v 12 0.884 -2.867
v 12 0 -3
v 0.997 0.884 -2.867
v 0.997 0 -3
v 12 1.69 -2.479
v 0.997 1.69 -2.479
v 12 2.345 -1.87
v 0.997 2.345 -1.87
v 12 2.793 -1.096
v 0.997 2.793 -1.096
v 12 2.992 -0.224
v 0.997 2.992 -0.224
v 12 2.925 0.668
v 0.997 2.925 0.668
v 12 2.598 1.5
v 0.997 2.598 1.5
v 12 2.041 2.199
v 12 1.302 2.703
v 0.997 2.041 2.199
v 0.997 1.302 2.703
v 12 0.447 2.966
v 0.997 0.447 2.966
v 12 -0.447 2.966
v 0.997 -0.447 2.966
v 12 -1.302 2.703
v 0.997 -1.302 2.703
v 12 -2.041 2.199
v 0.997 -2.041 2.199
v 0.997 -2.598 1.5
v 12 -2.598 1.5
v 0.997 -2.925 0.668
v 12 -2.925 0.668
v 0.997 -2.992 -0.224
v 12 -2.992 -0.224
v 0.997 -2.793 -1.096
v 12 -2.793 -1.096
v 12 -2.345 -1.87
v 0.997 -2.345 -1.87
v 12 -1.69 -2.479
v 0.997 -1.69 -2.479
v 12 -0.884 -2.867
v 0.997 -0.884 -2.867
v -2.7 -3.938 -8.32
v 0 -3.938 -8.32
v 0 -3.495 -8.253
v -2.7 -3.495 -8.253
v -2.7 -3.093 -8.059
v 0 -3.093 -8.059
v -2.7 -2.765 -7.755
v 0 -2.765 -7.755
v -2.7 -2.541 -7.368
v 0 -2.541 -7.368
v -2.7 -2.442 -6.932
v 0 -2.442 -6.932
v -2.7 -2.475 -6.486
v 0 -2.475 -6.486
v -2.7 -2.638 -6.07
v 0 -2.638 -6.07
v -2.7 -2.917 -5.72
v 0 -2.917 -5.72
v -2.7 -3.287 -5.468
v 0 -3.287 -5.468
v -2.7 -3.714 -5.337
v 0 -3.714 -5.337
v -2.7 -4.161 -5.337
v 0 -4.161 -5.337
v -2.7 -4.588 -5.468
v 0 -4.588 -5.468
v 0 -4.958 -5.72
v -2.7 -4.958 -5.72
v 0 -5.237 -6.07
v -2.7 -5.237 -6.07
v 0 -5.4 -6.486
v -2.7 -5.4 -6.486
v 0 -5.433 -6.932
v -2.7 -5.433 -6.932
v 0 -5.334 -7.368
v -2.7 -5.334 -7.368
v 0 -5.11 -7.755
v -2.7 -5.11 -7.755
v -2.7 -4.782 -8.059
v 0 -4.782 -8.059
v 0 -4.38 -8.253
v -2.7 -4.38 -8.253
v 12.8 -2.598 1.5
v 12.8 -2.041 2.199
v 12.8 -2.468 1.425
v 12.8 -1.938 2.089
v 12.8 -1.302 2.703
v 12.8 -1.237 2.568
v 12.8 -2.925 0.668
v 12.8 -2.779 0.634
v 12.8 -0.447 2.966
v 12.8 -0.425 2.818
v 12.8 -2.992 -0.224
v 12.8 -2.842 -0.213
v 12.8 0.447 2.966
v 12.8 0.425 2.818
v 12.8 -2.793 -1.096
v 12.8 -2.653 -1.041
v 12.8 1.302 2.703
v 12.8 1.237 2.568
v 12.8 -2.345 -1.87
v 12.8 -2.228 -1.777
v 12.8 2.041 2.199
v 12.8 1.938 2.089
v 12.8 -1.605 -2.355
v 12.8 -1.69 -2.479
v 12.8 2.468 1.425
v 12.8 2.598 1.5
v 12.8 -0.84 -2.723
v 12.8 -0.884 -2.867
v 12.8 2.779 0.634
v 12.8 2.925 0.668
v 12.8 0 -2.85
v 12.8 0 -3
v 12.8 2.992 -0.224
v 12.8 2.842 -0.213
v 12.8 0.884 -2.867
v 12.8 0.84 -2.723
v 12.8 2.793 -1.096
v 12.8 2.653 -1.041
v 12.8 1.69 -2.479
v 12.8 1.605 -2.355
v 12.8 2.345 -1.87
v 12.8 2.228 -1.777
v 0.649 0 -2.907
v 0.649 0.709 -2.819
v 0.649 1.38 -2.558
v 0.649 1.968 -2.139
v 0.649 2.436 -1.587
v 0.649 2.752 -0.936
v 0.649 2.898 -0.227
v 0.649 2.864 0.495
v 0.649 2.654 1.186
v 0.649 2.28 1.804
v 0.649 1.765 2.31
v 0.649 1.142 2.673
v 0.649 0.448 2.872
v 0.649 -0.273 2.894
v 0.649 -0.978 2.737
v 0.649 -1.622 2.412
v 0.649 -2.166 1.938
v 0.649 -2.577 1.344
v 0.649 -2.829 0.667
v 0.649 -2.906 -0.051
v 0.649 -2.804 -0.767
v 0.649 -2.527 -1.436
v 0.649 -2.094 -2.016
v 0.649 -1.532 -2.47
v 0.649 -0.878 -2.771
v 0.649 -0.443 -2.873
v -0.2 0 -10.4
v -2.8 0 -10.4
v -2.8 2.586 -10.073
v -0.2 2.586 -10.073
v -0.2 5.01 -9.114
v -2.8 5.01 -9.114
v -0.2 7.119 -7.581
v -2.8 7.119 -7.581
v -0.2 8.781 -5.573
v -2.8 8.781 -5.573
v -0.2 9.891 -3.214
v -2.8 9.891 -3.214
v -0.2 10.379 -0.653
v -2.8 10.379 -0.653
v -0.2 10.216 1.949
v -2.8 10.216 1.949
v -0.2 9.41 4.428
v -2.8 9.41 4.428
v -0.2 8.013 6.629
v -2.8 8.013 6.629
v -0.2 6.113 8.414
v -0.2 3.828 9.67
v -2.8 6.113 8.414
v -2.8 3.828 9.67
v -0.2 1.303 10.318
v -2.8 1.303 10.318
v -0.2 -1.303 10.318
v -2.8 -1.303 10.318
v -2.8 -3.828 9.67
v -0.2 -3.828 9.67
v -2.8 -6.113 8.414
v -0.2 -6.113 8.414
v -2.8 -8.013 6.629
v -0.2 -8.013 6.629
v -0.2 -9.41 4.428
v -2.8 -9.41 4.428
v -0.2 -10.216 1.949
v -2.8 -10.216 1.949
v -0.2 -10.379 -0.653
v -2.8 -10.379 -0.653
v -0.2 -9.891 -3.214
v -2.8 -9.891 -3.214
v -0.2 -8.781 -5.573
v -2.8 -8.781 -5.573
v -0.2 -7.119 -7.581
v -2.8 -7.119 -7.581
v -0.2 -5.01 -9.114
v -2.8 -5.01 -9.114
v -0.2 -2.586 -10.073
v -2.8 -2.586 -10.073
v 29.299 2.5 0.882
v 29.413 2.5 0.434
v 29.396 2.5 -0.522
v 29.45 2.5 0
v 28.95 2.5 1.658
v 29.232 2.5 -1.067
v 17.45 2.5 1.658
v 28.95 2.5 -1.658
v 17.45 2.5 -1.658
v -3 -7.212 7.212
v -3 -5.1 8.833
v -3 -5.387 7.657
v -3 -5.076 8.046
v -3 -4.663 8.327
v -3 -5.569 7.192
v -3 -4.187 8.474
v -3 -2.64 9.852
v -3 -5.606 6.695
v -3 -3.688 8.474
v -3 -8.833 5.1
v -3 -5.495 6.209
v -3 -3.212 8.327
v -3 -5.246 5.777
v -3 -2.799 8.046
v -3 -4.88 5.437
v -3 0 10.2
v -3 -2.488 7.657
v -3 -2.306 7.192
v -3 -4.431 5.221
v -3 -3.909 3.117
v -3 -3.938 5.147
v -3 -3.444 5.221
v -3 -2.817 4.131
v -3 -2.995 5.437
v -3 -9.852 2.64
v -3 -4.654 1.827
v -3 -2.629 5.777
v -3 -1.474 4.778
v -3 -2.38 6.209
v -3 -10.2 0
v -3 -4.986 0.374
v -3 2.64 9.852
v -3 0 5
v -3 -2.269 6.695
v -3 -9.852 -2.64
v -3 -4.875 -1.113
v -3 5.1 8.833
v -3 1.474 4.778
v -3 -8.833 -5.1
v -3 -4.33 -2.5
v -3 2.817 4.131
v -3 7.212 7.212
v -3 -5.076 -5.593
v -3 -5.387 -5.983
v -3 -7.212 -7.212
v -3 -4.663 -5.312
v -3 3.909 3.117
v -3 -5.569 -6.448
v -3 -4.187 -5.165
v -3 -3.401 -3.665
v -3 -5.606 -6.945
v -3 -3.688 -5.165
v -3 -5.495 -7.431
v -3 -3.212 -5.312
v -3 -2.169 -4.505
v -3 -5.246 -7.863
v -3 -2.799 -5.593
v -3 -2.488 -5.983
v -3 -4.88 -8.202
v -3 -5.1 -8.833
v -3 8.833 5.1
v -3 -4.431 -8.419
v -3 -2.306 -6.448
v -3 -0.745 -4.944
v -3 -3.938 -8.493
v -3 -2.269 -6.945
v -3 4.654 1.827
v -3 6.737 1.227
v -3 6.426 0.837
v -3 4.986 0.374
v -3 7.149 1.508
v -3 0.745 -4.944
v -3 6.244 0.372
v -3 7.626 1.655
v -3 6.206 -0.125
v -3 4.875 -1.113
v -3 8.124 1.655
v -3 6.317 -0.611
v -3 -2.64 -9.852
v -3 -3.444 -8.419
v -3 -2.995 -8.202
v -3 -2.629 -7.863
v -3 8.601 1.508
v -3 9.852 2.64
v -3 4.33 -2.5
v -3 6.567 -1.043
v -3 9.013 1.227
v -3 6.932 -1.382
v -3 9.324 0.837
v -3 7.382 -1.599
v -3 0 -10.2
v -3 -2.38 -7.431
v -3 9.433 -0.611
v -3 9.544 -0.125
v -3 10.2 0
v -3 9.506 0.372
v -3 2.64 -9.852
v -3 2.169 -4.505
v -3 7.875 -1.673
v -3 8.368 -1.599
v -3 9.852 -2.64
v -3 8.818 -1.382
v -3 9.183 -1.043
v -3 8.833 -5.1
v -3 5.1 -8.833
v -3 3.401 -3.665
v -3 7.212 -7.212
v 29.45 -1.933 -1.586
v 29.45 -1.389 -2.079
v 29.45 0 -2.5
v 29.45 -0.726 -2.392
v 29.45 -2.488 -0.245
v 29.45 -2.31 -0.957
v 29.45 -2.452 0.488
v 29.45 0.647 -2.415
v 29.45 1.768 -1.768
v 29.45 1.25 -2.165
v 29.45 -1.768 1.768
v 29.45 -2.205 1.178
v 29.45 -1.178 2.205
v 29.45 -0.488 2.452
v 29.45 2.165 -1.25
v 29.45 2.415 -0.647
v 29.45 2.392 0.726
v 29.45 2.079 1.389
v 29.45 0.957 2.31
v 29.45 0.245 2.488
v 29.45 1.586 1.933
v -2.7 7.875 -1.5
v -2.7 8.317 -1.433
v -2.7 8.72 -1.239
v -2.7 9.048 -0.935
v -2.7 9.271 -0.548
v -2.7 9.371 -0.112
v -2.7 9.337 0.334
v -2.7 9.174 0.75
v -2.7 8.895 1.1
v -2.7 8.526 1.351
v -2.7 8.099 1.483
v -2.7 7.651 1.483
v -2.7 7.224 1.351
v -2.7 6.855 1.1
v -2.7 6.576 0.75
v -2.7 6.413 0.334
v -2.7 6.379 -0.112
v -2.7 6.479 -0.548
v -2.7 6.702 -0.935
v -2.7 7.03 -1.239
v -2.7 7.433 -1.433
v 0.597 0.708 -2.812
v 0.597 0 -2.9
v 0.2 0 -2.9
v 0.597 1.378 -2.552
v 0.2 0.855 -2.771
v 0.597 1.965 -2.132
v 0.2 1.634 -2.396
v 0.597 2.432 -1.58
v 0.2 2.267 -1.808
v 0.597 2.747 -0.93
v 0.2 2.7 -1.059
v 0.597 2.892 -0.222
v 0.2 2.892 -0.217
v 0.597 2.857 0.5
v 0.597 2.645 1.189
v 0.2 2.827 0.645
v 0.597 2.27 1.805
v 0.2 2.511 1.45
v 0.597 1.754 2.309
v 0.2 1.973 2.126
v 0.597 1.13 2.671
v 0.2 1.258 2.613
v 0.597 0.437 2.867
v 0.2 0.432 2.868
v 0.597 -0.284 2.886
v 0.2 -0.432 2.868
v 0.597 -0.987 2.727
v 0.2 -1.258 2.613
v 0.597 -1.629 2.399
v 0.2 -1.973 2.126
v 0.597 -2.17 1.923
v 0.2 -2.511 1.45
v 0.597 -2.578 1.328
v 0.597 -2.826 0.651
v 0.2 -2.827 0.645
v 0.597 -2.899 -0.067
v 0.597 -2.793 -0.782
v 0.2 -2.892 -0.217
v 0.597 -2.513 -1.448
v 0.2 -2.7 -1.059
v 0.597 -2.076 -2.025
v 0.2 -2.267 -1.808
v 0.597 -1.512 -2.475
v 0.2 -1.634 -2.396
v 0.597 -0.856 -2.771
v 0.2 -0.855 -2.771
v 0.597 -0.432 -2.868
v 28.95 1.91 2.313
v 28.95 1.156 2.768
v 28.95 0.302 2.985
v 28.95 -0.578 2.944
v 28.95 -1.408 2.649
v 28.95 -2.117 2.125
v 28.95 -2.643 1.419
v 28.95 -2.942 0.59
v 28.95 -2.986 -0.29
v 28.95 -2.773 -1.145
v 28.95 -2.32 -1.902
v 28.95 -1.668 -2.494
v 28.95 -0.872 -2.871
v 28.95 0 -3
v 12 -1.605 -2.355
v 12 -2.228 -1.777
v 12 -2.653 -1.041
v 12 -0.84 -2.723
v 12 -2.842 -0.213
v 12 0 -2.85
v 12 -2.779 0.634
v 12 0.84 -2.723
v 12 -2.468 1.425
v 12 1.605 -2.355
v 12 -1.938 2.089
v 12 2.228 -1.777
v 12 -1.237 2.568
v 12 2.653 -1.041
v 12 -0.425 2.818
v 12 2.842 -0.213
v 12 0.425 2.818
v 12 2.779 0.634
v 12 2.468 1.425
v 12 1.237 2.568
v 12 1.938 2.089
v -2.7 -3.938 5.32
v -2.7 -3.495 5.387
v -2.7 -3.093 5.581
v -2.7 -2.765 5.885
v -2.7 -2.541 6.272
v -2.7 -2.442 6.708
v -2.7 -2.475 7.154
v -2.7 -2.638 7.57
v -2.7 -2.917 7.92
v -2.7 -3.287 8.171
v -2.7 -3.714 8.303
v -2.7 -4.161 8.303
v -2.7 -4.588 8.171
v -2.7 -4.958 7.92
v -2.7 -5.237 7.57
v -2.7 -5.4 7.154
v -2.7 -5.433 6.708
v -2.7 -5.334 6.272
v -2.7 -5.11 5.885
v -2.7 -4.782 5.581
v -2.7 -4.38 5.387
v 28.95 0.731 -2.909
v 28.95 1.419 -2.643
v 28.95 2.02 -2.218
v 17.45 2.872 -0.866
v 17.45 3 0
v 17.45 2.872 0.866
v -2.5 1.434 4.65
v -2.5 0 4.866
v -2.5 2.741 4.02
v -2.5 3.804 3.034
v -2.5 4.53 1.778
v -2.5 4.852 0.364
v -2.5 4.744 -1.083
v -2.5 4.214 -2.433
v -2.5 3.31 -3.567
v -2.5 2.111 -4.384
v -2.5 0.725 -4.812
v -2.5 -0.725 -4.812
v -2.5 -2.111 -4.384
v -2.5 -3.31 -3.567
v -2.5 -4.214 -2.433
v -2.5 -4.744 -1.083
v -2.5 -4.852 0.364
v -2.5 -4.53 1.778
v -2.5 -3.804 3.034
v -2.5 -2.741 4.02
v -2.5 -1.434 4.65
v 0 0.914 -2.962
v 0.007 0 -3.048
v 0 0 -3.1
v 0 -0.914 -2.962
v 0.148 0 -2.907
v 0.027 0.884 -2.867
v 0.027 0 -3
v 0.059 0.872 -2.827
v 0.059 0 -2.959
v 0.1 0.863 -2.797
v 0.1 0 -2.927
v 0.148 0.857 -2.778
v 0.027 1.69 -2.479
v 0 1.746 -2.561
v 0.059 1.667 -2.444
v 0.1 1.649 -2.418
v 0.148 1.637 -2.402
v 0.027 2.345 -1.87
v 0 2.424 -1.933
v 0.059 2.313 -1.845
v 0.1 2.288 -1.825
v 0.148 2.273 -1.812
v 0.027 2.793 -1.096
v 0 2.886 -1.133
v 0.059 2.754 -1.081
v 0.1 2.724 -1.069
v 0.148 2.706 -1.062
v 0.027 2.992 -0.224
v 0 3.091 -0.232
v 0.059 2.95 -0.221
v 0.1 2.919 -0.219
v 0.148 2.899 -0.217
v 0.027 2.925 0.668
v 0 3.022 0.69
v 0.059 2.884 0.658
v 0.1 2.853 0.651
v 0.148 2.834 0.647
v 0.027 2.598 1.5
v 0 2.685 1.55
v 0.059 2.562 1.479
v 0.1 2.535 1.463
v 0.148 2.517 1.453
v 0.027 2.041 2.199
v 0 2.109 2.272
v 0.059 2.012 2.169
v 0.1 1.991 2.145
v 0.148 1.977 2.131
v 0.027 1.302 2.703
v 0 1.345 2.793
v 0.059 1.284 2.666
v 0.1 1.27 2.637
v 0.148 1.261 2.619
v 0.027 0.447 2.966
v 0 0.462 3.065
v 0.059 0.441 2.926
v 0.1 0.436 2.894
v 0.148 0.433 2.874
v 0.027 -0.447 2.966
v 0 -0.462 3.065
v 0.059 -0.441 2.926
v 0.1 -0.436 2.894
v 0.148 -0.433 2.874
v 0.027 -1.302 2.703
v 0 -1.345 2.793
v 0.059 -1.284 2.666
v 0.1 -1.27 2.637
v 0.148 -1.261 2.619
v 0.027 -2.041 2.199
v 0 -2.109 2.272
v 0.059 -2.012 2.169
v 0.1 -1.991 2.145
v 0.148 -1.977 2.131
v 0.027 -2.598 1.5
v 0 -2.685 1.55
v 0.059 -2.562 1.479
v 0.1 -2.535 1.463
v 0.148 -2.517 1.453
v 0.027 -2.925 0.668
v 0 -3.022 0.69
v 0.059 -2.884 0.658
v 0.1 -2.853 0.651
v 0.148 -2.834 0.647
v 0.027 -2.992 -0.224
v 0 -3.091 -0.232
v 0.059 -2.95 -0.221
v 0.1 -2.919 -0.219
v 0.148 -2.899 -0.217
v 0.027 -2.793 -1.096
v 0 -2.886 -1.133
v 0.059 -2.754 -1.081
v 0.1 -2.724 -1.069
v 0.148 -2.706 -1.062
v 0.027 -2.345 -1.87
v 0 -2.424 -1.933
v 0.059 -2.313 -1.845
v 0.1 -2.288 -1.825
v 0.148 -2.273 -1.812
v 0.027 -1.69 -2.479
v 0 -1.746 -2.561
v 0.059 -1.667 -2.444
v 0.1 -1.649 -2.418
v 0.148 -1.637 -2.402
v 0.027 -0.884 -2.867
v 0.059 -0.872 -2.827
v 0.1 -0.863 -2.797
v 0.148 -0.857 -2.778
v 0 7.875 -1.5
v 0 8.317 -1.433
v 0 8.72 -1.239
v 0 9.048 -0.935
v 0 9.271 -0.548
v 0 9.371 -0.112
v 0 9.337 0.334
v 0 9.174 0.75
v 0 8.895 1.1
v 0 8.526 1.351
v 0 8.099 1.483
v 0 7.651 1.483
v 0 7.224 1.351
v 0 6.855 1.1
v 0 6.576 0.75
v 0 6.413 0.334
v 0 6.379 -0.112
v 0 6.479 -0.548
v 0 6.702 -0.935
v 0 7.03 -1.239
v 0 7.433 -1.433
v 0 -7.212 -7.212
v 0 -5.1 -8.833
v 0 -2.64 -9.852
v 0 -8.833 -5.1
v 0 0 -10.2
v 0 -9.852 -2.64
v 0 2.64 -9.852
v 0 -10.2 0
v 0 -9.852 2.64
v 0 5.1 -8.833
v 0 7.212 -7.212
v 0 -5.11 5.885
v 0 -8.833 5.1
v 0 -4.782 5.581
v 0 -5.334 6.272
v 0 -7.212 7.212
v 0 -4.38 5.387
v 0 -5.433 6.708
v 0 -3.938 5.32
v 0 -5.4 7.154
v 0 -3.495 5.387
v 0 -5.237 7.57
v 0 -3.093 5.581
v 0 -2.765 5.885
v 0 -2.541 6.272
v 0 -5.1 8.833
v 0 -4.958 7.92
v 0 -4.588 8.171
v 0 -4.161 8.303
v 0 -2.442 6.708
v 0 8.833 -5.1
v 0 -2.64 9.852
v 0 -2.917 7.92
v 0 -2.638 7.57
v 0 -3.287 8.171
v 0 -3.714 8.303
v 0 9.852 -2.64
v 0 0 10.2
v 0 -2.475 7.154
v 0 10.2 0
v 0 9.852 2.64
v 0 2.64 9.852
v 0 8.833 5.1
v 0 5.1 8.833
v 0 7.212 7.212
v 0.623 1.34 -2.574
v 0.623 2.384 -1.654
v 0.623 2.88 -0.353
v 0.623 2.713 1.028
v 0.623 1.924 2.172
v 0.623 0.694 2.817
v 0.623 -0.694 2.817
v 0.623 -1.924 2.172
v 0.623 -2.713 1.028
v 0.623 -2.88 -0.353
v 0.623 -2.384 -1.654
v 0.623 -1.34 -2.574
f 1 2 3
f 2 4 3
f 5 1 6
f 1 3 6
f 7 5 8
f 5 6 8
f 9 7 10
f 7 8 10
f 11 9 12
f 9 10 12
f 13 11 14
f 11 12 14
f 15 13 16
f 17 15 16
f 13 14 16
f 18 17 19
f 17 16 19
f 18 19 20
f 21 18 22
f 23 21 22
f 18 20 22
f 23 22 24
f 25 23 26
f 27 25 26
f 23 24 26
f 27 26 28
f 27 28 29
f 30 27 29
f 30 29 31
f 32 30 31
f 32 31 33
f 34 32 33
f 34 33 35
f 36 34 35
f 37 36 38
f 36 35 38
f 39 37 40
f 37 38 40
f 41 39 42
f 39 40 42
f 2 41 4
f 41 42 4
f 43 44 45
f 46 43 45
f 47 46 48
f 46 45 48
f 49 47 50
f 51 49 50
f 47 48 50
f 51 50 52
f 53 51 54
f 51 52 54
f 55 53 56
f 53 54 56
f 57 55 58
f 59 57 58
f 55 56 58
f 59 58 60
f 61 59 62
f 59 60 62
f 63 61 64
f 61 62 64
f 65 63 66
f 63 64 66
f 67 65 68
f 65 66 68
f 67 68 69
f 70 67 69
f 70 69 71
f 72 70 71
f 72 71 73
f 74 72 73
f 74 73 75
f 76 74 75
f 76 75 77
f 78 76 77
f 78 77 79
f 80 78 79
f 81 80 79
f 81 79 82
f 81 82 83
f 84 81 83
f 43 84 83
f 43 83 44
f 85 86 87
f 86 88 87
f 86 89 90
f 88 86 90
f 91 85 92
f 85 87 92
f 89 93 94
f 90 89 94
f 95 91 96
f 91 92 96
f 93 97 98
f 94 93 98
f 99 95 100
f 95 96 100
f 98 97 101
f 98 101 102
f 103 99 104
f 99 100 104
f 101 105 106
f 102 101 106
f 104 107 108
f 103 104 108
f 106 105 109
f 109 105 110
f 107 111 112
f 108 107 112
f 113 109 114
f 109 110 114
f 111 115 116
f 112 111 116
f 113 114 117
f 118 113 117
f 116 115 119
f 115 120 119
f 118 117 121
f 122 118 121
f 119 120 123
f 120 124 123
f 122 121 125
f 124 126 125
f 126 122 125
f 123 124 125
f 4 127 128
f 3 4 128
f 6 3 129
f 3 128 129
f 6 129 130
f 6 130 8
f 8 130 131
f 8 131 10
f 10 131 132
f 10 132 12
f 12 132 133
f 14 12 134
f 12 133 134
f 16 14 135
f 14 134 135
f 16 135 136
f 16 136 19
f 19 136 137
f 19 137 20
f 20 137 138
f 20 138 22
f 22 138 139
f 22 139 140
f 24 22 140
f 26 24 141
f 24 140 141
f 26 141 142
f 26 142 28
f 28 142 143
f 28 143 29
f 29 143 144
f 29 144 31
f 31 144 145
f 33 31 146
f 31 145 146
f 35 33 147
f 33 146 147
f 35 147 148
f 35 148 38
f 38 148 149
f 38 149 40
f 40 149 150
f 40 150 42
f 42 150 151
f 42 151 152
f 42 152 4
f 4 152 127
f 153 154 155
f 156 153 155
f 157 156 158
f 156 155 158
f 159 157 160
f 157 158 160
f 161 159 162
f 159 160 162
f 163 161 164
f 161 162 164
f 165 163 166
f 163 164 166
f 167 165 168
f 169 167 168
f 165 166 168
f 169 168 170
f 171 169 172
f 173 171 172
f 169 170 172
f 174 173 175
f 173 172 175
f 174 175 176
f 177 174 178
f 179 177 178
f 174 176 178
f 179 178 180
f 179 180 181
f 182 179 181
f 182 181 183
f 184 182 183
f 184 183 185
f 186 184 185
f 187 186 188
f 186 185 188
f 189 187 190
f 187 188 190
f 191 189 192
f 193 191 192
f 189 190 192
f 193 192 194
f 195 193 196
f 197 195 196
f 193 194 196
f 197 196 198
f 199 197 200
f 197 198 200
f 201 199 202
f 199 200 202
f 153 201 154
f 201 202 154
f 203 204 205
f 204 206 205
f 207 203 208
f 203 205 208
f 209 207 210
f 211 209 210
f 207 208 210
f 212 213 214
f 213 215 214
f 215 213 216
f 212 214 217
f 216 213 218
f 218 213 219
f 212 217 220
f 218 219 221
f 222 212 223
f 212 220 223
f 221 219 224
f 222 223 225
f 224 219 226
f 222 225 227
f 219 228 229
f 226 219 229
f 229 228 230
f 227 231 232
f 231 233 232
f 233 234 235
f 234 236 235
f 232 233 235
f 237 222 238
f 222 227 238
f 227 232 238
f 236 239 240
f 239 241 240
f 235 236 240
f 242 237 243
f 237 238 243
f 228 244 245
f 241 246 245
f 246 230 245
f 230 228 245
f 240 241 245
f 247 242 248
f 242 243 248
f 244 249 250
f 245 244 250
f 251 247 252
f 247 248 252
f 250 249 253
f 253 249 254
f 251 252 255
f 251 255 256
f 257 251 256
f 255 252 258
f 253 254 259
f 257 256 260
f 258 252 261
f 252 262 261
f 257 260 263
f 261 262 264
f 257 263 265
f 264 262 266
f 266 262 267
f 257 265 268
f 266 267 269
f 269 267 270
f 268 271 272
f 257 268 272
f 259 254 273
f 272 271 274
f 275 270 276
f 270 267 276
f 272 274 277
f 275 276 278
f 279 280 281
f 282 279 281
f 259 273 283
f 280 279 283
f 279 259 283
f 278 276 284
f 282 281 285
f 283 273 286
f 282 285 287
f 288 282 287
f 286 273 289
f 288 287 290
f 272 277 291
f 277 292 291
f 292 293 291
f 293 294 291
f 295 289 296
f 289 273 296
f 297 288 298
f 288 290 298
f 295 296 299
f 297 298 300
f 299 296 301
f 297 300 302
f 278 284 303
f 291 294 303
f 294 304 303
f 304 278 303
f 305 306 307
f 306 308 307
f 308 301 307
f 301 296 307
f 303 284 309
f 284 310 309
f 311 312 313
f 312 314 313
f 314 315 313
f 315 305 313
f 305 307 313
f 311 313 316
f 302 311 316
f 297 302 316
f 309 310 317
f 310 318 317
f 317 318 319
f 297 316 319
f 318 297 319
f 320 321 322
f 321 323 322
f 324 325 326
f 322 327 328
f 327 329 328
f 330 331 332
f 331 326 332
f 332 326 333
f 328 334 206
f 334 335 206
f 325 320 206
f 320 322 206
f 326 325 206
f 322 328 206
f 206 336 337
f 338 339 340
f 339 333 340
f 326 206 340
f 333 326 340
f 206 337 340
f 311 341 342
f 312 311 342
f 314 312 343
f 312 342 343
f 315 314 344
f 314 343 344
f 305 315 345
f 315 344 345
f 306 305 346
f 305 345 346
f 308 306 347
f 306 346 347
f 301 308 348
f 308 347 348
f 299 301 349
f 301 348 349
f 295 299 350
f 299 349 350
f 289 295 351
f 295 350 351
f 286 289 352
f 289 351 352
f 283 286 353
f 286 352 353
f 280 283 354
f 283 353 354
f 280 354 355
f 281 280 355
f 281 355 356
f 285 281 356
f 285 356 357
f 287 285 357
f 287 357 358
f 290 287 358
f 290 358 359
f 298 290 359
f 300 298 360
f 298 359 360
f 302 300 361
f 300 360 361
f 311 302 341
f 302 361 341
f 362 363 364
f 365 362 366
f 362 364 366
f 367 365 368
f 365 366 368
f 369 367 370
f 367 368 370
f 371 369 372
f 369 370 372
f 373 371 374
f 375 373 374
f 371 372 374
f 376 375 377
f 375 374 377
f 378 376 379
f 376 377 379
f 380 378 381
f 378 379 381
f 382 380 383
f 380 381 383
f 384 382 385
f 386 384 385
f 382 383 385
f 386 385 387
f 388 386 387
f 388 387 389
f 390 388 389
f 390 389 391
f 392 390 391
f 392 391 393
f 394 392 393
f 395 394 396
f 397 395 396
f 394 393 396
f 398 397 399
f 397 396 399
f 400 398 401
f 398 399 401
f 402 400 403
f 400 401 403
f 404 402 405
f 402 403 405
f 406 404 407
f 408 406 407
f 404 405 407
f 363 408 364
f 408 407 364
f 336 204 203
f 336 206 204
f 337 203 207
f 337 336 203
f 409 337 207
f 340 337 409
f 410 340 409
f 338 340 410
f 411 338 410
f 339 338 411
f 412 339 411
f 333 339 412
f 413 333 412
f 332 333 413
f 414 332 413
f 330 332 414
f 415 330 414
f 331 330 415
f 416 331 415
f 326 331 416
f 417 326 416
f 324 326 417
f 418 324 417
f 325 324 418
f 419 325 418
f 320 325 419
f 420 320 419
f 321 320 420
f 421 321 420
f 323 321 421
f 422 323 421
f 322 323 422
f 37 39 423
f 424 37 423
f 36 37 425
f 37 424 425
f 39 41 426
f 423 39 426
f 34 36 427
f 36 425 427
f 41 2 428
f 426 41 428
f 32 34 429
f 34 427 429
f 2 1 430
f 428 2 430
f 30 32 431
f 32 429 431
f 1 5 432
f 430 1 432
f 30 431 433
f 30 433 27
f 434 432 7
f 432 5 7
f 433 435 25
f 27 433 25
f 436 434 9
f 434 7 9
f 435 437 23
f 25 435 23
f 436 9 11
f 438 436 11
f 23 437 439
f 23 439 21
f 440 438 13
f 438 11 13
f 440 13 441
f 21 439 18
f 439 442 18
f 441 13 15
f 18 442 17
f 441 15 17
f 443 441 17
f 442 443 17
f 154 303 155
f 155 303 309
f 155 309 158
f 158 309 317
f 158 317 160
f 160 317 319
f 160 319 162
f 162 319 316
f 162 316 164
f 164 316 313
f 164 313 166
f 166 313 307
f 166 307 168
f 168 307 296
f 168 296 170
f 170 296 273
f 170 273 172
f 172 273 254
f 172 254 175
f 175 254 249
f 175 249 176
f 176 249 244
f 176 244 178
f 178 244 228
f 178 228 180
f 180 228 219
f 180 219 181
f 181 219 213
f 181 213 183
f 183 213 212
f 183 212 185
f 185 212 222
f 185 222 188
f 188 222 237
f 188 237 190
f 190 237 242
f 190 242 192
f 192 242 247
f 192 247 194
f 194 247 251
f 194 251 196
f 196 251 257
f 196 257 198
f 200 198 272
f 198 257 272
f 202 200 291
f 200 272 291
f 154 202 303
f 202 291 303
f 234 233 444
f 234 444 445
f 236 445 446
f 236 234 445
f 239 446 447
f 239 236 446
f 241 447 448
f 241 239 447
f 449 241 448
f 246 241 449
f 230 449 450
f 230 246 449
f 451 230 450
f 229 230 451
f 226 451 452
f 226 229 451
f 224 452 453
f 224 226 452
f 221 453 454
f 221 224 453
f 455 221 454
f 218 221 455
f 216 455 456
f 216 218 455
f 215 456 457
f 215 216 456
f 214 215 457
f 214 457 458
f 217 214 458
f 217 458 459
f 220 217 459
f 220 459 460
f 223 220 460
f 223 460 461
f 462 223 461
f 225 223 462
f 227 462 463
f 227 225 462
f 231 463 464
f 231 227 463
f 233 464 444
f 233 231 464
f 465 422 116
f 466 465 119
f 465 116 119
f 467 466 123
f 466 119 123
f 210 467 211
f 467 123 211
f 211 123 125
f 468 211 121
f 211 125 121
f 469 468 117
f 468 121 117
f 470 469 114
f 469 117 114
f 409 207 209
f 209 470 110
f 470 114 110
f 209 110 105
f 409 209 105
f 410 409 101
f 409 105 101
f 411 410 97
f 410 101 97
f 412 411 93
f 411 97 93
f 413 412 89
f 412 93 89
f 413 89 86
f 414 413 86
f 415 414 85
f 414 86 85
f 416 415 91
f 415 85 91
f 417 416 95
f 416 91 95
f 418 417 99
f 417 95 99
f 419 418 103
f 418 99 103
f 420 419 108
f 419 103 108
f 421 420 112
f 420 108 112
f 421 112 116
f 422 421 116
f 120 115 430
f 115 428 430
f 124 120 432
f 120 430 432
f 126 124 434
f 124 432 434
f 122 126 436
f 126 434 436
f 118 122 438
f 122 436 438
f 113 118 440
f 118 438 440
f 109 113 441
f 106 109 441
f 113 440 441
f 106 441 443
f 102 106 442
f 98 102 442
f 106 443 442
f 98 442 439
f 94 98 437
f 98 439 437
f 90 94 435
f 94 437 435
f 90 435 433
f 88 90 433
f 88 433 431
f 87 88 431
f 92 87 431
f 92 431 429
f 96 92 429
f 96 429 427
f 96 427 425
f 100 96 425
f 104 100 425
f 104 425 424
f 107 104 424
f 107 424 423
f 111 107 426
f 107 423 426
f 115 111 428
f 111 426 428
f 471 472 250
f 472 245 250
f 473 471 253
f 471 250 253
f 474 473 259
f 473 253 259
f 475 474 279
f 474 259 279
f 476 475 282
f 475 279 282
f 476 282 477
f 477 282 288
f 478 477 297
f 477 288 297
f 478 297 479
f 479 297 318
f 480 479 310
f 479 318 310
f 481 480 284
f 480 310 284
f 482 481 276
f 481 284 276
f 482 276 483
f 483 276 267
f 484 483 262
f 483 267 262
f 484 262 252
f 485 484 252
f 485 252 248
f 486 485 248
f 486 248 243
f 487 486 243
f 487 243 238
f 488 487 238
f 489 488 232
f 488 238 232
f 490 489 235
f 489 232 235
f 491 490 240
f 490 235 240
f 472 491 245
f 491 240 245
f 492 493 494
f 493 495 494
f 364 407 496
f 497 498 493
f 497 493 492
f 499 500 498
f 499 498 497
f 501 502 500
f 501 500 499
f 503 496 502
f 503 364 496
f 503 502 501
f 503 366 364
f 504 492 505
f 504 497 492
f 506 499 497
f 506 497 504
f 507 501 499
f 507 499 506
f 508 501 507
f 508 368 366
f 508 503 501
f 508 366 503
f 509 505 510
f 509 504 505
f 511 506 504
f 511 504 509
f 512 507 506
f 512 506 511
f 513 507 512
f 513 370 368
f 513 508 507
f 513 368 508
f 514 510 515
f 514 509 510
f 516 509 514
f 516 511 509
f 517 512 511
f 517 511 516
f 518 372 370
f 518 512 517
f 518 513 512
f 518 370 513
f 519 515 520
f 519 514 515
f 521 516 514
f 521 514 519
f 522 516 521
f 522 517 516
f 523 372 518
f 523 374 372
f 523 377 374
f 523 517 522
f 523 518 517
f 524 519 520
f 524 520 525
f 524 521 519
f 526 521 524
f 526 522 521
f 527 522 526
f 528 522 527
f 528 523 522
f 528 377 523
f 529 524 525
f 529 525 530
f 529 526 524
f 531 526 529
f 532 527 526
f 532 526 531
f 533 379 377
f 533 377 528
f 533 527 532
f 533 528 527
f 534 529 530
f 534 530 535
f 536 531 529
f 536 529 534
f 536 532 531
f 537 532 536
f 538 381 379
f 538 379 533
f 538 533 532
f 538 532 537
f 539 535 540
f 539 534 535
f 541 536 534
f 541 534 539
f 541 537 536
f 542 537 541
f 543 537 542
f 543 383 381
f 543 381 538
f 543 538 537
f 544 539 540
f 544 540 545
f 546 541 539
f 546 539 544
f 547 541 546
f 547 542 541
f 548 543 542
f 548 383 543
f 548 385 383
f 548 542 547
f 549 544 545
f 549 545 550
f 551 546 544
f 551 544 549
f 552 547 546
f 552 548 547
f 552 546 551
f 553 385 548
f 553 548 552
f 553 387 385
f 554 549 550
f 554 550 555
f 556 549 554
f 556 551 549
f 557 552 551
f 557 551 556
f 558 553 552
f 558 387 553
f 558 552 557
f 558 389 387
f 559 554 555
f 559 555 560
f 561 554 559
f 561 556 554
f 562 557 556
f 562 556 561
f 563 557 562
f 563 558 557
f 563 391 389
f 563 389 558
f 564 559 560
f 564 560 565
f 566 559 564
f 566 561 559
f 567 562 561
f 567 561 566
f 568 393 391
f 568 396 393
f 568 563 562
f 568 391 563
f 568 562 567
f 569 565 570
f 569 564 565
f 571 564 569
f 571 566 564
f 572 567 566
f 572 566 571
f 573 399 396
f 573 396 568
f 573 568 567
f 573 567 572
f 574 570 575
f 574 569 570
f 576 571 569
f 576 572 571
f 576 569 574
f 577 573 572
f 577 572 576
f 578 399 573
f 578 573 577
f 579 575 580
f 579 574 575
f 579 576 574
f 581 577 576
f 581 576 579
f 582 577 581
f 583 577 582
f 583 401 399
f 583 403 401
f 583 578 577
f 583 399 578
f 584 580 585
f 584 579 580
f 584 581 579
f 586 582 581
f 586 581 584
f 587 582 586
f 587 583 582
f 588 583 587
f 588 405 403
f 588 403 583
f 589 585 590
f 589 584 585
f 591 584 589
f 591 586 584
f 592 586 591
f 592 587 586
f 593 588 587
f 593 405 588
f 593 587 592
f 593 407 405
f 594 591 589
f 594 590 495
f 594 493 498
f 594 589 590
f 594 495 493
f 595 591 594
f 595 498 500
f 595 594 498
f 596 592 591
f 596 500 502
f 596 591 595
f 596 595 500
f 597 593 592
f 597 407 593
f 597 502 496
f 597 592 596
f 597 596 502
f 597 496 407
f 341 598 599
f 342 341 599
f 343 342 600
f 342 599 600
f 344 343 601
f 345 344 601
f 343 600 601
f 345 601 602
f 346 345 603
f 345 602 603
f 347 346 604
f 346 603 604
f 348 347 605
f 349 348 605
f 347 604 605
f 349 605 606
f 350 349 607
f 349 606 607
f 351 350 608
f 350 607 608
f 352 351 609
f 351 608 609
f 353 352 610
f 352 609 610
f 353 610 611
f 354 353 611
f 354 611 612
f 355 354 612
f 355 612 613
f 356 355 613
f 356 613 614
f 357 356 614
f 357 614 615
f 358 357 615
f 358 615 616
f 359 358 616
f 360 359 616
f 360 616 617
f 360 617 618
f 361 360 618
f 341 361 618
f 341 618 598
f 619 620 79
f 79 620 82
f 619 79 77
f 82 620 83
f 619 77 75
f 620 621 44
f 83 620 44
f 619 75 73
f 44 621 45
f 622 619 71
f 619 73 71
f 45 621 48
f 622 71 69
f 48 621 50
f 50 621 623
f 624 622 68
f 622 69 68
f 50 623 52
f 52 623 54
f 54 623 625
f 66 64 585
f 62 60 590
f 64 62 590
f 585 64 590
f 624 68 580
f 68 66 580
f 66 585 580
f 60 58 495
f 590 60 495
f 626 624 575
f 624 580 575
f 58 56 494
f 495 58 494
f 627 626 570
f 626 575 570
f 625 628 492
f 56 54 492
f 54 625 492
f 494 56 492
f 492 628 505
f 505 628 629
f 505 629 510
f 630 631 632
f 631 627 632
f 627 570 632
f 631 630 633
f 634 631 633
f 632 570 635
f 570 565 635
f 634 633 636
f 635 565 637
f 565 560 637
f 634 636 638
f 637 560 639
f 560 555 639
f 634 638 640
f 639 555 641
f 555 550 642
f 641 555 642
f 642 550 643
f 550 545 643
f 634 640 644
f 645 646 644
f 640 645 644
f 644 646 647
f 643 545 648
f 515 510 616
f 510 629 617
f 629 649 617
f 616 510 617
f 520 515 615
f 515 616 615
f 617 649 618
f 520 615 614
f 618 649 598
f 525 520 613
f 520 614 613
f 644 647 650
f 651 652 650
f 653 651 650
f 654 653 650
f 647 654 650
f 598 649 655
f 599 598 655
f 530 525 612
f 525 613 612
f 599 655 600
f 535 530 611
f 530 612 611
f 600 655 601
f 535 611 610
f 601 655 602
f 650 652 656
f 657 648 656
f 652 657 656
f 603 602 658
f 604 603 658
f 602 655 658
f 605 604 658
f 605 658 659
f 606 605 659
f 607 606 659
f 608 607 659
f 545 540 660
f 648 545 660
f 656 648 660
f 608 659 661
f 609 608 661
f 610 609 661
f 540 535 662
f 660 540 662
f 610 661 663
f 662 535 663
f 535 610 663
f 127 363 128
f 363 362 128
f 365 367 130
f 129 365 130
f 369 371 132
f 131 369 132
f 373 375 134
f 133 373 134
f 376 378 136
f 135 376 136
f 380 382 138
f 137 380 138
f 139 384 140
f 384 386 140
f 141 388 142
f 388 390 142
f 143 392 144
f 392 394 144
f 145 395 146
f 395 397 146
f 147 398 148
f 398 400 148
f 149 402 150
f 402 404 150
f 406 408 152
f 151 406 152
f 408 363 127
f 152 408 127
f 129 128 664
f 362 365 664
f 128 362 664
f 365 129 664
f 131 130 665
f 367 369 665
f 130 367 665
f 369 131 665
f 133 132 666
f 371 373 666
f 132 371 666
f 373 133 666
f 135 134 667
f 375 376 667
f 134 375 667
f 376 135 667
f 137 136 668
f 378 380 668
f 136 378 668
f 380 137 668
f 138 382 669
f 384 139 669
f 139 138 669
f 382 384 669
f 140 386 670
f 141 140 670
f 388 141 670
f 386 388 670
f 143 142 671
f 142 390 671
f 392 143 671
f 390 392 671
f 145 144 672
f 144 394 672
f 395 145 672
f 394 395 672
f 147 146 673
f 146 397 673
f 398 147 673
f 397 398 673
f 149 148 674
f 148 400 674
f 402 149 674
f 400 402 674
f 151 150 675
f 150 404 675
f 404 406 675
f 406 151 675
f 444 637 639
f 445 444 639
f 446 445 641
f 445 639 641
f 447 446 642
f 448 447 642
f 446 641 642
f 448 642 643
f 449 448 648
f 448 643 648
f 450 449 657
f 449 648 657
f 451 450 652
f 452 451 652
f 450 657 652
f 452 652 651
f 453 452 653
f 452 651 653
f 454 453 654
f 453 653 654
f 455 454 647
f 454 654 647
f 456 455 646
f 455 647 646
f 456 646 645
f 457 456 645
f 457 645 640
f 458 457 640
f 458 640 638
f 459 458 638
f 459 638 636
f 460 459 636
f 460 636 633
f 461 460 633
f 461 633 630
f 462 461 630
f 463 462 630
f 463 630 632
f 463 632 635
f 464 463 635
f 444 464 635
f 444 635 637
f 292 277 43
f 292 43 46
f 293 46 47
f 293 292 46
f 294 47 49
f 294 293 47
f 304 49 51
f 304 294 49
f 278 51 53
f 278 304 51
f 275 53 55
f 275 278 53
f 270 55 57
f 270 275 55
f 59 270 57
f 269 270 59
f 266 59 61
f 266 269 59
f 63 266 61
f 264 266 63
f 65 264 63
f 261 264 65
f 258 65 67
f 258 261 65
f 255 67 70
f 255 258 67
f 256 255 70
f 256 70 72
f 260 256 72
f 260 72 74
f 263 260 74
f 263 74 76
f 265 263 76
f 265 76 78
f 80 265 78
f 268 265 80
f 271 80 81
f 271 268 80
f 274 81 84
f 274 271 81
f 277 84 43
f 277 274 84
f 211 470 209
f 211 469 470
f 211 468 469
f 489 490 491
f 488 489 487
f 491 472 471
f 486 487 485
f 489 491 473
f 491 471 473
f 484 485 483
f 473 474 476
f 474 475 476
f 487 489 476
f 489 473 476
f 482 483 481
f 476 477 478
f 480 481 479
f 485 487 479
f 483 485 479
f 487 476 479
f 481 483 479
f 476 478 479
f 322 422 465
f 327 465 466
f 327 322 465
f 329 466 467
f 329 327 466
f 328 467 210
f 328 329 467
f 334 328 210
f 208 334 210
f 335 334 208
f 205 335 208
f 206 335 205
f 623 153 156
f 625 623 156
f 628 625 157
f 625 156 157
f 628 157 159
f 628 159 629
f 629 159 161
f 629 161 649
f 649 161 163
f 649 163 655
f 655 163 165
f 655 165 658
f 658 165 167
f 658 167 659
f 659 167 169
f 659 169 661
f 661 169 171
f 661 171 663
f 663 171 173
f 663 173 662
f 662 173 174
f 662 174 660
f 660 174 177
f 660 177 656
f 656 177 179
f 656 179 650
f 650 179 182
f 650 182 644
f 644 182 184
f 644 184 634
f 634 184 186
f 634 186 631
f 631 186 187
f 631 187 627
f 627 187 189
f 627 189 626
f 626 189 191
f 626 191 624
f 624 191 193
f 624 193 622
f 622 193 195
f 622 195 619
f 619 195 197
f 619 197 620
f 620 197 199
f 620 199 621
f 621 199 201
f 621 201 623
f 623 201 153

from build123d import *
from OCP.BRepFilletAPI import BRepFilletAPI_MakeChamfer

# Parameters (mm, degrees)
DIAM_TRE_DU_PER_AGE_3_0_3_1_D     = 3
DIAM_TRE_DU_PER_AGE_3_0_3_1_DEPTH = 32.45
CHANFREIN1_SIZE                   = 0.5
CHANFREIN2_SIZE                   = 0.2
CHANFREIN3_SIZE                   = 0.173205081
CHANFREIN3_SIZE2                  = 0.3
CHANFREIN4_SIZE                   = 0.3
CHANFREIN4_SIZE2                  = 0.173205081
CONG_1_R                          = 0.2
ESQUISSE6_W                       = 8
ESQUISSE6_H                       = 1.5
ENL_V_MAT_EXTRU_1_DEPTH           = 12


with BuildPart() as part:
    # Esquisse1 → Révolution1 (revolve)
    with BuildSketch(Plane.XY, mode=Mode.PRIVATE) as r_volution1_sk:
        Polygon((-3, 10.4), (-3, 0), (29.45, 0), (29.45, 3), (12.8, 3), (12.8, 2.85), (12, 2.85), (12, 3), (0.996794919, 3), (0.623589838, 2.9), (0, 2.9), (0, 10.4), align=None)
    revolve(r_volution1_sk.sketch.rotate(Axis((-3, 0, 0), (1, 0, 0)), 270), axis=Axis((-3, 0, 0), (1, 0, 0)))

    # Diamètre du perçage Ø3.0 (3)1
    with Locations(Plane.ZY.offset(3)):
        with Locations((-6.819950055, -3.9375), (6.819950055, -3.9375), (0, 7.875)):
            Hole(DIAM_TRE_DU_PER_AGE_3_0_3_1_D / 2, depth=DIAM_TRE_DU_PER_AGE_3_0_3_1_DEPTH)

    # Esquisse4 → Perçage1 (revolve, cut)
    with BuildSketch(Plane(origin=(-3, 0, 0), x_dir=(0, 0, 1), z_dir=(0, 1, 0))):
        Polygon((0, 0), (0, 0.5), (4.866025404, 0.5), (5, 0), align=None)
    revolve(axis=Axis((107, 0, 0), (-1, 0, 0)), mode=Mode.SUBTRACT)

    # Chanfrein1
    chanfrein1_edges = [part.edges().sort_by_distance(p)[0] for p in [
        (29.45, 0, 3),
    ]]
    chamfer(chanfrein1_edges, length=CHANFREIN1_SIZE)

    # Chanfrein2
    chanfrein2_edges = [part.edges().sort_by_distance(p)[0] for p in [
        (-3, 0, 10.4),
        (0, 0, 10.4),
    ]]
    chamfer(chanfrein2_edges, length=CHANFREIN2_SIZE)

    # Chanfrein3
    chanfrein3_edges = [part.edges().sort_by_distance(p)[0] for p in [
        (-3, 7.875, 1.5),
    ]]
    chanfrein3_side = [part.faces().sort_by_distance(p)[0] for p in [
        (-3, 0, 9.911500433),
    ]]
    chamfer(chanfrein3_edges, length=CHANFREIN3_SIZE, length2=CHANFREIN3_SIZE2, reference=chanfrein3_side[0])

    # Chanfrein4: one chamfer whose edges measure the first distance from different faces: ONE call of the kernel's chamfer builder (chamfer() names one face for all edges)
    chanfrein4_edges_1 = [part.edges().sort_by_distance(p)[0] for p in [
        (-3, -3.9375, 8.319950055),
    ]]
    chanfrein4_side_1 = [part.faces().sort_by_distance(p)[0] for p in [
        (-1.5, -3.9375, 8.319950055),
    ]]
    chanfrein4_edges_2 = [part.edges().sort_by_distance(p)[0] for p in [
        (-3, -3.9375, -5.319950055),
    ]]
    chanfrein4_side_2 = [part.faces().sort_by_distance(p)[0] for p in [
        (-1.5, -3.9375, -5.319950055),
    ]]
    chanfrein4 = BRepFilletAPI_MakeChamfer(part.part.solid().wrapped)
    for e in chanfrein4_edges_1:
        chanfrein4.Add(CHANFREIN4_SIZE, CHANFREIN4_SIZE2, e.wrapped, chanfrein4_side_1[0].wrapped)  # the first distance lies on this face
    for e in chanfrein4_edges_2:
        chanfrein4.Add(CHANFREIN4_SIZE, CHANFREIN4_SIZE2, e.wrapped, chanfrein4_side_2[0].wrapped)  # the first distance lies on this face
    add(Compound.cast(chanfrein4.Shape()), mode=Mode.REPLACE)

    # Congé1
    cong_1_edges = [part.edges().sort_by_distance(p)[0] for p in [
        (0, 0, 2.9),
        (0.623589838, 0, 2.9),
    ]]
    fillet(cong_1_edges, radius=CONG_1_R)

    # Esquisse6 → Enlèv. mat.-Extru.1 (cut)
    with BuildSketch(Plane(origin=(29.45, 0, 0), x_dir=(0, 0, -1), z_dir=(1, 0, 0))):
        with Locations((0, 3.25)):
            Rectangle(ESQUISSE6_W, ESQUISSE6_H)
    extrude(amount=-ENL_V_MAT_EXTRU_1_DEPTH, mode=Mode.SUBTRACT)


solid = part.part
